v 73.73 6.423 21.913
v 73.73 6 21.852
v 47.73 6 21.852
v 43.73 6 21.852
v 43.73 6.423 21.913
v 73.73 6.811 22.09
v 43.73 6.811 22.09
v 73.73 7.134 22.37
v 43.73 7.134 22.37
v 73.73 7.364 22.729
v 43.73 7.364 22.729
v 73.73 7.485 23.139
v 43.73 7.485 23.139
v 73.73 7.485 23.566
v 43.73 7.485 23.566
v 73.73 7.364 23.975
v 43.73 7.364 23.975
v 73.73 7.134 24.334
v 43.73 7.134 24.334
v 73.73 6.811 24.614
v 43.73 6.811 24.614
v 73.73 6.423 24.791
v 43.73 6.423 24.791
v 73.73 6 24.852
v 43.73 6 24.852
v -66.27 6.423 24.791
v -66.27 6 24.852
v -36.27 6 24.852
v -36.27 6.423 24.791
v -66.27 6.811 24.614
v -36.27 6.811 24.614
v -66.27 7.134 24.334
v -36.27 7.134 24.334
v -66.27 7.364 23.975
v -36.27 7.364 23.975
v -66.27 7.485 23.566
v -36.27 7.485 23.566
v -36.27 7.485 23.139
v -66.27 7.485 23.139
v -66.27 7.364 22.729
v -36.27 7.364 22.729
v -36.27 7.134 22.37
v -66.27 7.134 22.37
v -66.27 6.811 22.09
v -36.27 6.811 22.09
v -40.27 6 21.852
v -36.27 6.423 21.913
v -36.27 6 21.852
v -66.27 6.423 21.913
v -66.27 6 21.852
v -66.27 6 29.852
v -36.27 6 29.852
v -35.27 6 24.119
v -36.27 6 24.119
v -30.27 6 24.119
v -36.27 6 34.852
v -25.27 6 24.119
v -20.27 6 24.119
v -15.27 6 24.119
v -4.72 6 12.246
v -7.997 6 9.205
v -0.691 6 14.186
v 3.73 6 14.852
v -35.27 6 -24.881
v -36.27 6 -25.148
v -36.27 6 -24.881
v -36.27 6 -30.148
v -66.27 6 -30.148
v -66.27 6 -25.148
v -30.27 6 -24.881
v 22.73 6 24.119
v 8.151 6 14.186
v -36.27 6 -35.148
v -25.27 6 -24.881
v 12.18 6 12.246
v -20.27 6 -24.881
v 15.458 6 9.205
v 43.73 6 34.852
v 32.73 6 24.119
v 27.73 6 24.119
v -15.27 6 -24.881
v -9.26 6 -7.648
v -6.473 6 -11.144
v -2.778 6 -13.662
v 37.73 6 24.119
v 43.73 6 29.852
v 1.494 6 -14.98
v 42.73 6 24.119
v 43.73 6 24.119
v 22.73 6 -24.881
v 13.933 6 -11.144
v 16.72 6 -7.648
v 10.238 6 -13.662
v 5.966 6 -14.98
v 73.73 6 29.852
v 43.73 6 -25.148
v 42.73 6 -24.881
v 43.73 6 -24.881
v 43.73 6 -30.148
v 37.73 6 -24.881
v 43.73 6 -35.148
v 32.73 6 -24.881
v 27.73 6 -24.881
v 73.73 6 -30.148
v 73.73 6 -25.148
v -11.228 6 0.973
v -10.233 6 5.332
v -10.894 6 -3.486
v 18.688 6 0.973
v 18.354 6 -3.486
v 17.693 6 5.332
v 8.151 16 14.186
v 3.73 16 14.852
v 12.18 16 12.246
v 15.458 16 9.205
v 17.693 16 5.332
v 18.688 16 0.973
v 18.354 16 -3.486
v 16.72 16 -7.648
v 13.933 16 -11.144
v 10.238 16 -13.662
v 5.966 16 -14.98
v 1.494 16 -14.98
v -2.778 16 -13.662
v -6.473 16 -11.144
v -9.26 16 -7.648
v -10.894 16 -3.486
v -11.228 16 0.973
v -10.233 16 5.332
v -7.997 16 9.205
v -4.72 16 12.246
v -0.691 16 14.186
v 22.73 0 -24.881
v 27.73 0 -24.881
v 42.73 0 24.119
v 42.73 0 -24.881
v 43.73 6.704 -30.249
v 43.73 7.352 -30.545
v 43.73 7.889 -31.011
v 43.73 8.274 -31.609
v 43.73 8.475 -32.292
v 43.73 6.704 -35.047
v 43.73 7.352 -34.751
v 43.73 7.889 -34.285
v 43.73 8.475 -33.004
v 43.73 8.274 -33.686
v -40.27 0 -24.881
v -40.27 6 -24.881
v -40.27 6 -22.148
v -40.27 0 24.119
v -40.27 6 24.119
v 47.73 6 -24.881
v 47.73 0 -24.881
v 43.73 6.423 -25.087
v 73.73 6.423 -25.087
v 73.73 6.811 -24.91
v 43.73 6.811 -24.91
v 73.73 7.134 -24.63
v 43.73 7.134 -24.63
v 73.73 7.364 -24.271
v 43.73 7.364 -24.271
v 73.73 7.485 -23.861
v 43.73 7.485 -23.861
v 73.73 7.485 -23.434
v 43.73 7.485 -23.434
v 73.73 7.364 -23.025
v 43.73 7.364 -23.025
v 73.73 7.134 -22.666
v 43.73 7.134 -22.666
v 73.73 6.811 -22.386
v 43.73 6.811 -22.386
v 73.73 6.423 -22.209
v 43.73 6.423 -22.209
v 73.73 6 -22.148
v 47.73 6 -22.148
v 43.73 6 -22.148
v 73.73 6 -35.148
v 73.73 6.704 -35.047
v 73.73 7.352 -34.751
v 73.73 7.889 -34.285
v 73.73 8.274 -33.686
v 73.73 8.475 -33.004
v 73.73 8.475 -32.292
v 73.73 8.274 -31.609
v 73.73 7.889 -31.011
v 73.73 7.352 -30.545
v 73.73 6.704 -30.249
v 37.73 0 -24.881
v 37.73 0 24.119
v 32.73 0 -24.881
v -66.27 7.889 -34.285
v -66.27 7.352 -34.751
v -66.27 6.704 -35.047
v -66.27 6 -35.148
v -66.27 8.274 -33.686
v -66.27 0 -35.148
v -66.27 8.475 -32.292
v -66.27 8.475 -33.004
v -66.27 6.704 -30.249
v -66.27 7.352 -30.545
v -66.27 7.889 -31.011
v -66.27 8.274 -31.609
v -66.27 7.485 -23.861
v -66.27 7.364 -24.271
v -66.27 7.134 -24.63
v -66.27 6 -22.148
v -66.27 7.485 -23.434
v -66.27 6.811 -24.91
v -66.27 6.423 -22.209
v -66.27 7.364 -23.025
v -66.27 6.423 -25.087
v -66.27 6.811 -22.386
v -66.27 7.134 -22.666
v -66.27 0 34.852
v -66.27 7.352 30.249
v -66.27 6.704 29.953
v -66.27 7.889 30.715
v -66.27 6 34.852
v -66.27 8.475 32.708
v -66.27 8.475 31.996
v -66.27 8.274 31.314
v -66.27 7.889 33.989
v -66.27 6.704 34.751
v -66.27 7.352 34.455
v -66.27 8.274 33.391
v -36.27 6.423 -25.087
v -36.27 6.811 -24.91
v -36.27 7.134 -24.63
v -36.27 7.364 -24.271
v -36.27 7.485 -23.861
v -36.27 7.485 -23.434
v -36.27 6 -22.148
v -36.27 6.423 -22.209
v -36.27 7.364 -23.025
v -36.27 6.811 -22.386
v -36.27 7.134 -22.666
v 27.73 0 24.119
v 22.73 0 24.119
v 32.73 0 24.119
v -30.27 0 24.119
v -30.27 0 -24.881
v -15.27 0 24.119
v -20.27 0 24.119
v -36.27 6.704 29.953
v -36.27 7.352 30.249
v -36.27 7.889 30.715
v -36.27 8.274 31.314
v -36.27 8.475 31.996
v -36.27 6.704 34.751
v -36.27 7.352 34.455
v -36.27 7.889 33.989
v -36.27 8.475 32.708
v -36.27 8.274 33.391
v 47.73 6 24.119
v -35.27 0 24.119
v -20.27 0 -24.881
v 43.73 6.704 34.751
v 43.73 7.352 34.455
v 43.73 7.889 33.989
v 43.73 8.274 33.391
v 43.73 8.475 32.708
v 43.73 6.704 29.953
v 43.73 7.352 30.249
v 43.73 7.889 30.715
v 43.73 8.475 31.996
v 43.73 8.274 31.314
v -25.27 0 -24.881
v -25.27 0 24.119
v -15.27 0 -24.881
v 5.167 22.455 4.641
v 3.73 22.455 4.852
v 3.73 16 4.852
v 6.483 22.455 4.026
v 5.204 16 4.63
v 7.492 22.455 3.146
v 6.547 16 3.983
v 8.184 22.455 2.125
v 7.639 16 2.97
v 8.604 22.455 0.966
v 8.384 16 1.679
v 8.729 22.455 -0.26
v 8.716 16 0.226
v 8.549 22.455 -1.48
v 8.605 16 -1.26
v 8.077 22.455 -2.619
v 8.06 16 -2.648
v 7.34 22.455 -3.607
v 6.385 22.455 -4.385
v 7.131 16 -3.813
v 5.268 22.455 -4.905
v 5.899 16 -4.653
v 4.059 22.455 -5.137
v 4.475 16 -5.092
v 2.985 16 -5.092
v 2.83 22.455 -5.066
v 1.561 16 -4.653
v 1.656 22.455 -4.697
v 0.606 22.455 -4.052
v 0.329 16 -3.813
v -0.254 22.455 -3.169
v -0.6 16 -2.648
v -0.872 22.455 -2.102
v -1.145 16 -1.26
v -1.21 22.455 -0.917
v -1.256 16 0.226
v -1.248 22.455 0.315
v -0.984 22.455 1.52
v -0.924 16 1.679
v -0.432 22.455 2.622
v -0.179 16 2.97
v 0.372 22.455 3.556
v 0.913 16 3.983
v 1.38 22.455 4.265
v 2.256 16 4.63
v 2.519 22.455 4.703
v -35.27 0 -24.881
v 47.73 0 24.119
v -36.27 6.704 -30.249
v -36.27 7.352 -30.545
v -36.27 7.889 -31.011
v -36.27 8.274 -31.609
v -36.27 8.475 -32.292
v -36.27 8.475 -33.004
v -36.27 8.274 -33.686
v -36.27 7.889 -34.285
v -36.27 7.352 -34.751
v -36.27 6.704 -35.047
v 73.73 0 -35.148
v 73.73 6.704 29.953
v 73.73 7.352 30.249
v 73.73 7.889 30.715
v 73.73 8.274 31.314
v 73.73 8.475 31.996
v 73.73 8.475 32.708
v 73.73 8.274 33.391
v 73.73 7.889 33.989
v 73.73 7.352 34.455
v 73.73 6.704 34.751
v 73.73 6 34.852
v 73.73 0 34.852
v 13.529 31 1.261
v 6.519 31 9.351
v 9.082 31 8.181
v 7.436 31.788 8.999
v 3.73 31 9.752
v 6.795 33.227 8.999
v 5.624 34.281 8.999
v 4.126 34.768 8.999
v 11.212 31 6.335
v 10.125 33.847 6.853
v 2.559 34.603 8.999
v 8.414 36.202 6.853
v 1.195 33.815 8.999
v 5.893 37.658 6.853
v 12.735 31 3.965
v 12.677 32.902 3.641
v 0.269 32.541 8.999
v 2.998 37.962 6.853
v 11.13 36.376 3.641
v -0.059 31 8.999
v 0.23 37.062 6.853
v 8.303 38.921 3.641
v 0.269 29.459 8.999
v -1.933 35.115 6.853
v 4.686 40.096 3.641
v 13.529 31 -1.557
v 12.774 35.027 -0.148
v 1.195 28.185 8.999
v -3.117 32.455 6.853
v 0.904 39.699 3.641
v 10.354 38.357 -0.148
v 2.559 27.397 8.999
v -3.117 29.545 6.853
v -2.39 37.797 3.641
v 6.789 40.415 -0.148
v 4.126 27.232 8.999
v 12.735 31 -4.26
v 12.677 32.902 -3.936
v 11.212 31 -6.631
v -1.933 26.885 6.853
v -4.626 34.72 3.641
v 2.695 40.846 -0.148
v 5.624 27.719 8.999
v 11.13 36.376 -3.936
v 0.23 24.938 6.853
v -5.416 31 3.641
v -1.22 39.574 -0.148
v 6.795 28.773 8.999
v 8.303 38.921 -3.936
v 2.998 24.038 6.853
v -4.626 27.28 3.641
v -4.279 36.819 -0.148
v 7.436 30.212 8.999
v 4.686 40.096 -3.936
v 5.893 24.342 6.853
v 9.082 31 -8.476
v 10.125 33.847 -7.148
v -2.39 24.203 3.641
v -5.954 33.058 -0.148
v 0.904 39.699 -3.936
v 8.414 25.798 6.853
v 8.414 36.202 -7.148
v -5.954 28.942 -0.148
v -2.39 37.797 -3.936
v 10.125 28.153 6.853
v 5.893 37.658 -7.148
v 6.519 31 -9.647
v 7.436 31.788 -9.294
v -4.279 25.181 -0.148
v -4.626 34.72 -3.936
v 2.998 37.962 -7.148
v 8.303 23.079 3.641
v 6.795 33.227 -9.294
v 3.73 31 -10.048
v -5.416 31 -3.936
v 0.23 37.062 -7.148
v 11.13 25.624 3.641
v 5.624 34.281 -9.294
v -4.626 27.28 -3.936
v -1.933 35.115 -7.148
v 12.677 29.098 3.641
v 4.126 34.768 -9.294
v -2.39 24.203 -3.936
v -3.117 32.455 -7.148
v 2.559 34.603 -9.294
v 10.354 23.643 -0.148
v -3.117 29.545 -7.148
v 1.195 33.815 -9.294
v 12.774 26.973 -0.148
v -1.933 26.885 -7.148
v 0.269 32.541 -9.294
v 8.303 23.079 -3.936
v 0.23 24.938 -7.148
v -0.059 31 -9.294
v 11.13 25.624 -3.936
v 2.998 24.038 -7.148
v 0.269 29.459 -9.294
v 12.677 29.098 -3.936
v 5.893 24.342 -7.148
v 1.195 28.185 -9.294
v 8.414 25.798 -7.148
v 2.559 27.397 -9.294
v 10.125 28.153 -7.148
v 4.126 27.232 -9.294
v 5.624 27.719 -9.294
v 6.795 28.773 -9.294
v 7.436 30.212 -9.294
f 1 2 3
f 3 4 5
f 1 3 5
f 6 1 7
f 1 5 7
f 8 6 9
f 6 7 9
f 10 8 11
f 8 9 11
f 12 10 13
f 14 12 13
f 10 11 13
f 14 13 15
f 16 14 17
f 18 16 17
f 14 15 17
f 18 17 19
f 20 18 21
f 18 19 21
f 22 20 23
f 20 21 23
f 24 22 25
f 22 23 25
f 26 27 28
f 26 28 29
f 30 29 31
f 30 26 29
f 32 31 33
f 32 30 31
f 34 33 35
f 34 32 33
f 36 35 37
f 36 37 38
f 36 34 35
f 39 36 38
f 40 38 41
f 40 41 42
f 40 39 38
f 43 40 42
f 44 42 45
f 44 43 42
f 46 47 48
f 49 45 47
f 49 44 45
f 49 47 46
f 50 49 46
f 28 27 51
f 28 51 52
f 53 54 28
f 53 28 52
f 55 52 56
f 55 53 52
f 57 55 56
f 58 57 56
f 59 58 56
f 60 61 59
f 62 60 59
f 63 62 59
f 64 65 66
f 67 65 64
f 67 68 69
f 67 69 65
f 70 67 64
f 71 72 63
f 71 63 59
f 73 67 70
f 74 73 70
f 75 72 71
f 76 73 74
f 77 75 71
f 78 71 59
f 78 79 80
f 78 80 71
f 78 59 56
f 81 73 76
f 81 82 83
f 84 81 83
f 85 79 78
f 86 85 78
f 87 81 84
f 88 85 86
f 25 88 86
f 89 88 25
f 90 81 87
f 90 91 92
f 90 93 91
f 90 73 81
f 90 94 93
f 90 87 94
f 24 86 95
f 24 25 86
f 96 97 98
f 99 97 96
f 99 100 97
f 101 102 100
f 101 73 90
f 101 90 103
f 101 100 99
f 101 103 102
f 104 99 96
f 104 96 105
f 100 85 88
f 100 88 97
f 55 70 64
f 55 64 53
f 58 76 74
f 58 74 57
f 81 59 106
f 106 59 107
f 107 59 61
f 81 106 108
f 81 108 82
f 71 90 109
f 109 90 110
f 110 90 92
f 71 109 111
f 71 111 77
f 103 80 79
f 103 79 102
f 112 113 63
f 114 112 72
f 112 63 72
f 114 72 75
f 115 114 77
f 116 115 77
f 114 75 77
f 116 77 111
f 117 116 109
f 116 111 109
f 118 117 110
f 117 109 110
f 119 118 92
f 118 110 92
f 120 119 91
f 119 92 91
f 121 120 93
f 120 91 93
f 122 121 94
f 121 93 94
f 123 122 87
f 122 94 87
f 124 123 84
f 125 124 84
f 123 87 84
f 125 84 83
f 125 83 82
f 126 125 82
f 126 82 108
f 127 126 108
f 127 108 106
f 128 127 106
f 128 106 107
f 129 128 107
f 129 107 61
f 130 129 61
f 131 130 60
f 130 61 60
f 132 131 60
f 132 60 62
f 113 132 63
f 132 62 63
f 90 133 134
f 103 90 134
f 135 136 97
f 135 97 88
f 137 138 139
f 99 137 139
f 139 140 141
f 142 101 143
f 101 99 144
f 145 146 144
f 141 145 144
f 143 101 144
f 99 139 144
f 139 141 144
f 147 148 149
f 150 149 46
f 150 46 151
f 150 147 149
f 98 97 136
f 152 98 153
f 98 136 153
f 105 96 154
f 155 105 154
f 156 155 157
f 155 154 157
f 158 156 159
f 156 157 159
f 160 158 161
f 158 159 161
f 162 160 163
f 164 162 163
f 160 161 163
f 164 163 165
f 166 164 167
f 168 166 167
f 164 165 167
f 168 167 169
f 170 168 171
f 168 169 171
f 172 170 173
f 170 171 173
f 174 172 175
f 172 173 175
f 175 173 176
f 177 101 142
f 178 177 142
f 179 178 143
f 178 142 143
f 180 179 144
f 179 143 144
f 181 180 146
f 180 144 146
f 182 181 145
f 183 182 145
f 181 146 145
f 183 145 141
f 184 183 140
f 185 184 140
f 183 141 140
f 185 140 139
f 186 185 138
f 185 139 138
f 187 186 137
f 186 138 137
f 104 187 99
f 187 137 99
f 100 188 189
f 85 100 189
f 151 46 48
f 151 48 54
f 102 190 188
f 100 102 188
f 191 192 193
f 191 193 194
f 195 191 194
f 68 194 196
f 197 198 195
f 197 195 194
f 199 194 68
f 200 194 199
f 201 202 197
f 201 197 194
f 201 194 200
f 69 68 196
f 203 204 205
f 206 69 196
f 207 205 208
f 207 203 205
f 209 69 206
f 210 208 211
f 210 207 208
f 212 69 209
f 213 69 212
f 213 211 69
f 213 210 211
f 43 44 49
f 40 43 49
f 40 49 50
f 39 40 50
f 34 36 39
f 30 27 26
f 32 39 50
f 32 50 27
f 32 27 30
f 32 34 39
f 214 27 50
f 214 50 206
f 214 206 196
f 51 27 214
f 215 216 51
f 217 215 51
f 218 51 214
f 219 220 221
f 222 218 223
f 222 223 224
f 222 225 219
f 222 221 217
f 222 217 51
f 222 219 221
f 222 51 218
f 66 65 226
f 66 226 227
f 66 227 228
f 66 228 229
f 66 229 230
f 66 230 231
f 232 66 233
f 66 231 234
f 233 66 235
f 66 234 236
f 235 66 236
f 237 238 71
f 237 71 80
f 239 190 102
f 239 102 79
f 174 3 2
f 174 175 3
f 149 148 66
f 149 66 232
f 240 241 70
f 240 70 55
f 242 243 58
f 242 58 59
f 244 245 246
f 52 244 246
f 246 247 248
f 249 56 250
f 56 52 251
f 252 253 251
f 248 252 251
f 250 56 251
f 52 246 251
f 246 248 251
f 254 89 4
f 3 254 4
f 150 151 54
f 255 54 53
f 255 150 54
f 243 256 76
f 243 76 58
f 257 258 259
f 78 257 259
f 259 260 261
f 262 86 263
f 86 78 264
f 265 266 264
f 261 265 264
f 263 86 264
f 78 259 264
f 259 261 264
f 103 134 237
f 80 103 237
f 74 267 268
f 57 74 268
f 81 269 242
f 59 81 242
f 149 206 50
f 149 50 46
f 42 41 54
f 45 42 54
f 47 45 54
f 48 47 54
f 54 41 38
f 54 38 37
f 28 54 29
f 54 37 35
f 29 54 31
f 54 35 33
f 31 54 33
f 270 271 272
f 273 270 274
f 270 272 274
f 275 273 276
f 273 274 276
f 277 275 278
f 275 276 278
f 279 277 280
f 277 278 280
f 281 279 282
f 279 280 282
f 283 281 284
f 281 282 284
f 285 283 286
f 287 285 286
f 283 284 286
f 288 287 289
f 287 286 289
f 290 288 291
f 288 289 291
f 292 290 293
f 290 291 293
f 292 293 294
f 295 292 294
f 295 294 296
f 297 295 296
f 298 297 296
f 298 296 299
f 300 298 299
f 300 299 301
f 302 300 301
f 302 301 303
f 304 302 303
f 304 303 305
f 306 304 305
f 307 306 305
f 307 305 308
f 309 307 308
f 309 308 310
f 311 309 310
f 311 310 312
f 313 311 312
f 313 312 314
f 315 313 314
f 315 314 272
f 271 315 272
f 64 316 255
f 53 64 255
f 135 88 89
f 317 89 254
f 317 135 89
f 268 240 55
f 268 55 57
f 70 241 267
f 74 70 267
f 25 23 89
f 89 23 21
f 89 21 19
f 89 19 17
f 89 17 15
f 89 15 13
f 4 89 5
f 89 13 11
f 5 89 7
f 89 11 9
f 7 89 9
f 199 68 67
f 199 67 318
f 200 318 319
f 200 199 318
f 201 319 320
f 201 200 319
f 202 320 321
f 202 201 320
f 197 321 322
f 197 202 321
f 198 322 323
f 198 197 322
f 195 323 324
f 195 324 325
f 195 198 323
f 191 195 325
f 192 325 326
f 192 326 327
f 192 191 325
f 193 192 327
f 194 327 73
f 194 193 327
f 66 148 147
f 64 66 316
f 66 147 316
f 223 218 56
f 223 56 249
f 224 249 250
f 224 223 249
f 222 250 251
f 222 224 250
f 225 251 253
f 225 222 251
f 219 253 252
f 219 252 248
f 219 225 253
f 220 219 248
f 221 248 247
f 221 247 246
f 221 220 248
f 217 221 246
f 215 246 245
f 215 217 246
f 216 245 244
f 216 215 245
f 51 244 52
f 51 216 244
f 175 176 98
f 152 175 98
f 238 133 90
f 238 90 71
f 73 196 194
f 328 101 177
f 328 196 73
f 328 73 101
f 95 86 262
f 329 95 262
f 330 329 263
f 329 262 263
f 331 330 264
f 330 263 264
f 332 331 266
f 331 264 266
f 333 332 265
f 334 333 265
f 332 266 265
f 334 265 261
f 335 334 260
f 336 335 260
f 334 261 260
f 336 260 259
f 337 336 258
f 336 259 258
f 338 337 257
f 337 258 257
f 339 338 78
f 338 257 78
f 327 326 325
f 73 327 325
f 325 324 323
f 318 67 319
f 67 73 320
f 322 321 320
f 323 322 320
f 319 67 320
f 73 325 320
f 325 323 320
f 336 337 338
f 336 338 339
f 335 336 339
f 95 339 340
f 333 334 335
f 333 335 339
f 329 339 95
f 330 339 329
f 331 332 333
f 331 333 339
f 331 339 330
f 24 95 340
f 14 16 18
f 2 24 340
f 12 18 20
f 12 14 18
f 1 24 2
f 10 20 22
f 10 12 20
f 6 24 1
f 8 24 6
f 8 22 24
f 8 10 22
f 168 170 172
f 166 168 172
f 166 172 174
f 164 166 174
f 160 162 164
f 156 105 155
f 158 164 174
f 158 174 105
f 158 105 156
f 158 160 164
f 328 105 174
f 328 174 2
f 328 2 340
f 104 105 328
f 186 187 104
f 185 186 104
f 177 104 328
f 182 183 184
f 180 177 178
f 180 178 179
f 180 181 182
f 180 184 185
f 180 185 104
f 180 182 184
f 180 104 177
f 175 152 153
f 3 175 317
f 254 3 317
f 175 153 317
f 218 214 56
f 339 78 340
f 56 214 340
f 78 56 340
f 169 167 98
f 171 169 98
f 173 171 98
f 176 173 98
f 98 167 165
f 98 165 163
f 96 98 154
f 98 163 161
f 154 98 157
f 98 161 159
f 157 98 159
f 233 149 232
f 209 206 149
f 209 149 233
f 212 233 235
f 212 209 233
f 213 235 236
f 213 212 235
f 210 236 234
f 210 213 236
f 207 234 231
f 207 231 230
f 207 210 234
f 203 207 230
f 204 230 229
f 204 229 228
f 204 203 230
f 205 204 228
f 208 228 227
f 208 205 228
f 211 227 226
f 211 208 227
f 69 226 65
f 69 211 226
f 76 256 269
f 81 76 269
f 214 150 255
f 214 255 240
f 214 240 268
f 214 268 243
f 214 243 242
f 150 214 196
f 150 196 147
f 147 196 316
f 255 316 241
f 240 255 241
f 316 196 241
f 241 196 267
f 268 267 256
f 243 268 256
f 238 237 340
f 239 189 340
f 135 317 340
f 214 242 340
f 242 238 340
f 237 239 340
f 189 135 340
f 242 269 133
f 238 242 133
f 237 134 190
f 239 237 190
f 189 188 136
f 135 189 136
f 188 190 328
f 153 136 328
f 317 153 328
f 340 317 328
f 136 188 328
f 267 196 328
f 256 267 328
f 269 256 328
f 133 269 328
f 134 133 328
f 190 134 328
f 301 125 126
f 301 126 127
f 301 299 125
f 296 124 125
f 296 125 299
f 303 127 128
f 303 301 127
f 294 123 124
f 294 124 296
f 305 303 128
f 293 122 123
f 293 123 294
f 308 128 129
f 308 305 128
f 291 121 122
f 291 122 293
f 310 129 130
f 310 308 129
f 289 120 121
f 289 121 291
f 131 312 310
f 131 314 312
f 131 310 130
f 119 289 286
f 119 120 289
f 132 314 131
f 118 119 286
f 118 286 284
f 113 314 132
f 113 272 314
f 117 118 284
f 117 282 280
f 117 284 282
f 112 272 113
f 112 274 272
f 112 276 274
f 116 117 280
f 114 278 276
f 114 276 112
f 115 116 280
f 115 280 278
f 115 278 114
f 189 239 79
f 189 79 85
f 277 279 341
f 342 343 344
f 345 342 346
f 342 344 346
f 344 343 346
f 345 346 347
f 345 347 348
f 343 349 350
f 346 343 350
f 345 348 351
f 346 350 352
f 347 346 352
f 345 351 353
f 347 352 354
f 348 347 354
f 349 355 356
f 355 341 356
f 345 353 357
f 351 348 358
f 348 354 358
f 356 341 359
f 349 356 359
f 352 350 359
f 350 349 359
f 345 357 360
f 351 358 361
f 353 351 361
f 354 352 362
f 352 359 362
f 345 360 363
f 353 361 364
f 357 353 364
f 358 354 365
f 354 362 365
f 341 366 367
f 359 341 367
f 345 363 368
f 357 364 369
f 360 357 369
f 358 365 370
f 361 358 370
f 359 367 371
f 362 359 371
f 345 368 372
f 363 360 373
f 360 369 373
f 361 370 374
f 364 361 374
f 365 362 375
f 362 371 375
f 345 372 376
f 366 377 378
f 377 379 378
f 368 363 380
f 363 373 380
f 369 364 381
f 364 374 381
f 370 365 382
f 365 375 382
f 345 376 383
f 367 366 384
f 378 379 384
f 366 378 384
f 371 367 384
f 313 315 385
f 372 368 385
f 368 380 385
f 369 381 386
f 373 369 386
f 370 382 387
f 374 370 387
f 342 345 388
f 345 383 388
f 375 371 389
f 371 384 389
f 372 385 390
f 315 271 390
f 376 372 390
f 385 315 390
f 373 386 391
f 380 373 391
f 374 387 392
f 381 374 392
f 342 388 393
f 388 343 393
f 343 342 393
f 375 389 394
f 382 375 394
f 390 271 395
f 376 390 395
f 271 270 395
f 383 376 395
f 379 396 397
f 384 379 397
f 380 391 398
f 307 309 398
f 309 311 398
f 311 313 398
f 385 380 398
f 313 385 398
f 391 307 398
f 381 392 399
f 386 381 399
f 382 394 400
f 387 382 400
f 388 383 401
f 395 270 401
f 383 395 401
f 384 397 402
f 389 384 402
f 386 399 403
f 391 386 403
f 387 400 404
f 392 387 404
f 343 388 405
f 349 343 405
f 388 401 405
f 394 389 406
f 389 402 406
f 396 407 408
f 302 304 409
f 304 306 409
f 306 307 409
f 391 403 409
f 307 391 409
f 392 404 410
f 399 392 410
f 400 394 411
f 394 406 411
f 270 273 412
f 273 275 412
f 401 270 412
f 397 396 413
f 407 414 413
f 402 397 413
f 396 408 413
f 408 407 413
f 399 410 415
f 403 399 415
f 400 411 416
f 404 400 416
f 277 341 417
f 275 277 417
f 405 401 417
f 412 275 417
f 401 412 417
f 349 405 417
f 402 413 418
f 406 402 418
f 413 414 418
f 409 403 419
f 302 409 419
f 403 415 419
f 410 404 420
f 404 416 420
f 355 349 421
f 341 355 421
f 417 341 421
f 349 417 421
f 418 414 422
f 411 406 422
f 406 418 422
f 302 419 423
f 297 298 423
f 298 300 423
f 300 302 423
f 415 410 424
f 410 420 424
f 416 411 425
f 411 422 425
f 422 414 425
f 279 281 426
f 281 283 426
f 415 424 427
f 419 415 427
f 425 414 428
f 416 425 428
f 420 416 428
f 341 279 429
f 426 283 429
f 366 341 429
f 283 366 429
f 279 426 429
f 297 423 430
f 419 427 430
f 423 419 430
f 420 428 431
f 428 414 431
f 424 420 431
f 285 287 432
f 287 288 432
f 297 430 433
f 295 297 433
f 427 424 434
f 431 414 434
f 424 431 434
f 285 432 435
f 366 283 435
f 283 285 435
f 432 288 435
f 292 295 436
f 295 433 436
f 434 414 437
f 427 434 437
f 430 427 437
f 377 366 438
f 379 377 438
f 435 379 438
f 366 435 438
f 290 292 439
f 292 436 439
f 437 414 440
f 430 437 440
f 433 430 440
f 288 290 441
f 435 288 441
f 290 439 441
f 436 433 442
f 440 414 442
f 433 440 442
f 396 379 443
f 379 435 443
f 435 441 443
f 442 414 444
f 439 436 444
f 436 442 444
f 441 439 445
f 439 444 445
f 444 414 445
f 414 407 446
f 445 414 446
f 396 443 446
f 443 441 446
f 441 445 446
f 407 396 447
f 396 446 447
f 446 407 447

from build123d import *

# Parameters (mm, degrees)
SKETCH_1_W          = 140
SKETCH_1_H          = 70
EXTRUDE_1_DEPTH     = 6
SKETCH_2_R          = 15
EXTRUDE_2_DEPTH     = 10
SKETCH_5_R          = 5
EXTRUDE_4_DEPTH     = 15
SKETCH_7_W          = 5
SKETCH_7_H          = 49
CUT_EXTRUDE_1_DEPTH = 6
EXTRUDE_5_DEPTH     = 30
EXTRUDE_START       = -30
EXTRUDE_6_DEPTH     = 30


with BuildPart() as part:
    # 草图1 → 凸台-拉伸1 (new body)
    with BuildSketch(Plane(origin=(0, 0, 0), x_dir=(1, 0, 0), z_dir=(0, 1, 0))):
        with Locations((3.730042991, 0.147818203)):
            Rectangle(SKETCH_1_W, SKETCH_1_H)
    extrude(amount=EXTRUDE_1_DEPTH)

    # 草图2 → 凸台-拉伸2 (add)
    with BuildSketch(Plane(origin=(0, 6, 0), x_dir=(1, 0, 0), z_dir=(0, 1, 0))):
        with Locations(Location((3.730042991, 0.147818203, 0), (0, 0, 270))):
            Circle(SKETCH_2_R)
    extrude(amount=EXTRUDE_2_DEPTH)

    # 草图5 → 凸台-拉伸4 (add)
    with BuildSketch(Plane(origin=(0, 16, 0), x_dir=(1, 0, 0), z_dir=(0, 1, 0))):
        with Locations(Location((3.730042991, 0.147818203, 0), (0, 0, 270))):
            Circle(SKETCH_5_R)
    extrude(amount=EXTRUDE_4_DEPTH)

    # 草图6 → 旋转2 (revolve)
    with BuildSketch(Plane(origin=(0, 31, 0), x_dir=(1, 0, 0), z_dir=(0, 1, 0))):
        with BuildLine():
            Line((3.730042991, 10.047818203), (3.730042991, -9.752181797))
            ThreePointArc((3.730042991, -9.752181797), (13.630042991, 0.147818203), (3.730042991, 10.047818203))
        make_face()
    revolve(axis=Axis((3.730042991, 31, -10.047818203), (0, 0, 1)))

    # 草图7 → 切除-拉伸1 (cut)
    with BuildSketch(Plane.XZ):
        with Locations((25.230042991, -0.380891395)):
            Rectangle(SKETCH_7_W, SKETCH_7_H)
        with Locations((-37.769957009, -0.380891395)):
            Rectangle(SKETCH_7_W, SKETCH_7_H)
        with Locations((35.230042991, -0.380891395)):
            Rectangle(SKETCH_7_W, SKETCH_7_H)
        with Locations((45.230042991, -0.380891395)):
            Rectangle(SKETCH_7_W, SKETCH_7_H)
        with Locations((-27.769957009, -0.380891395)):
            Rectangle(SKETCH_7_W, SKETCH_7_H)
        with Locations((-17.769957009, -0.380891395)):
            Rectangle(SKETCH_7_W, SKETCH_7_H)
    extrude(amount=-CUT_EXTRUDE_1_DEPTH, mode=Mode.SUBTRACT)

    # 草图9 → 凸台-拉伸5 (add)
    with BuildSketch(Plane.ZY.offset(66.269957009)):
        with BuildLine():
            Line((29.852181797, 6), (34.852181797, 6))
            ThreePointArc((34.852181797, 6), (32.352181797, 8.5), (29.852181797, 6))
        make_face()
        with BuildLine():
            Line((-35.147818203, 6), (-30.147818203, 6))
            ThreePointArc((-30.147818203, 6), (-32.647818203, 8.5), (-35.147818203, 6))
        make_face()
        with BuildLine():
            Line((21.852181797, 6), (24.852181797, 6))
            ThreePointArc((24.852181797, 6), (23.352181797, 7.5), (21.852181797, 6))
        make_face()
        with BuildLine():
            Line((-25.147818203, 6), (-22.147818203, 6))
            ThreePointArc((-22.147818203, 6), (-23.647818203, 7.5), (-25.147818203, 6))
        make_face()
    extrude(amount=-EXTRUDE_5_DEPTH)

    # 草图11 → 凸台-拉伸6 (add)
    with BuildSketch(Plane(origin=(73.730042991, 0, 0), x_dir=(0, 0, -1), z_dir=(1, 0, 0)).offset(EXTRUDE_START)):
        with BuildLine():
            Line((30.147818203, 6), (35.147818203, 6))
            ThreePointArc((35.147818203, 6), (32.647818203, 8.5), (30.147818203, 6))
        make_face()
        with BuildLine():
            Line((-34.852181797, 6), (-29.852181797, 6))
            ThreePointArc((-29.852181797, 6), (-32.352181797, 8.5), (-34.852181797, 6))
        make_face()
        with BuildLine():
            Line((22.147818203, 6), (25.147818203, 6))
            ThreePointArc((25.147818203, 6), (23.647818203, 7.5), (22.147818203, 6))
        make_face()
        with BuildLine():
            Line((-24.852181797, 6), (-21.852181797, 6))
            ThreePointArc((-21.852181797, 6), (-23.352181797, 7.5), (-24.852181797, 6))
        make_face()
    extrude(amount=EXTRUDE_6_DEPTH)


solid = part.part
